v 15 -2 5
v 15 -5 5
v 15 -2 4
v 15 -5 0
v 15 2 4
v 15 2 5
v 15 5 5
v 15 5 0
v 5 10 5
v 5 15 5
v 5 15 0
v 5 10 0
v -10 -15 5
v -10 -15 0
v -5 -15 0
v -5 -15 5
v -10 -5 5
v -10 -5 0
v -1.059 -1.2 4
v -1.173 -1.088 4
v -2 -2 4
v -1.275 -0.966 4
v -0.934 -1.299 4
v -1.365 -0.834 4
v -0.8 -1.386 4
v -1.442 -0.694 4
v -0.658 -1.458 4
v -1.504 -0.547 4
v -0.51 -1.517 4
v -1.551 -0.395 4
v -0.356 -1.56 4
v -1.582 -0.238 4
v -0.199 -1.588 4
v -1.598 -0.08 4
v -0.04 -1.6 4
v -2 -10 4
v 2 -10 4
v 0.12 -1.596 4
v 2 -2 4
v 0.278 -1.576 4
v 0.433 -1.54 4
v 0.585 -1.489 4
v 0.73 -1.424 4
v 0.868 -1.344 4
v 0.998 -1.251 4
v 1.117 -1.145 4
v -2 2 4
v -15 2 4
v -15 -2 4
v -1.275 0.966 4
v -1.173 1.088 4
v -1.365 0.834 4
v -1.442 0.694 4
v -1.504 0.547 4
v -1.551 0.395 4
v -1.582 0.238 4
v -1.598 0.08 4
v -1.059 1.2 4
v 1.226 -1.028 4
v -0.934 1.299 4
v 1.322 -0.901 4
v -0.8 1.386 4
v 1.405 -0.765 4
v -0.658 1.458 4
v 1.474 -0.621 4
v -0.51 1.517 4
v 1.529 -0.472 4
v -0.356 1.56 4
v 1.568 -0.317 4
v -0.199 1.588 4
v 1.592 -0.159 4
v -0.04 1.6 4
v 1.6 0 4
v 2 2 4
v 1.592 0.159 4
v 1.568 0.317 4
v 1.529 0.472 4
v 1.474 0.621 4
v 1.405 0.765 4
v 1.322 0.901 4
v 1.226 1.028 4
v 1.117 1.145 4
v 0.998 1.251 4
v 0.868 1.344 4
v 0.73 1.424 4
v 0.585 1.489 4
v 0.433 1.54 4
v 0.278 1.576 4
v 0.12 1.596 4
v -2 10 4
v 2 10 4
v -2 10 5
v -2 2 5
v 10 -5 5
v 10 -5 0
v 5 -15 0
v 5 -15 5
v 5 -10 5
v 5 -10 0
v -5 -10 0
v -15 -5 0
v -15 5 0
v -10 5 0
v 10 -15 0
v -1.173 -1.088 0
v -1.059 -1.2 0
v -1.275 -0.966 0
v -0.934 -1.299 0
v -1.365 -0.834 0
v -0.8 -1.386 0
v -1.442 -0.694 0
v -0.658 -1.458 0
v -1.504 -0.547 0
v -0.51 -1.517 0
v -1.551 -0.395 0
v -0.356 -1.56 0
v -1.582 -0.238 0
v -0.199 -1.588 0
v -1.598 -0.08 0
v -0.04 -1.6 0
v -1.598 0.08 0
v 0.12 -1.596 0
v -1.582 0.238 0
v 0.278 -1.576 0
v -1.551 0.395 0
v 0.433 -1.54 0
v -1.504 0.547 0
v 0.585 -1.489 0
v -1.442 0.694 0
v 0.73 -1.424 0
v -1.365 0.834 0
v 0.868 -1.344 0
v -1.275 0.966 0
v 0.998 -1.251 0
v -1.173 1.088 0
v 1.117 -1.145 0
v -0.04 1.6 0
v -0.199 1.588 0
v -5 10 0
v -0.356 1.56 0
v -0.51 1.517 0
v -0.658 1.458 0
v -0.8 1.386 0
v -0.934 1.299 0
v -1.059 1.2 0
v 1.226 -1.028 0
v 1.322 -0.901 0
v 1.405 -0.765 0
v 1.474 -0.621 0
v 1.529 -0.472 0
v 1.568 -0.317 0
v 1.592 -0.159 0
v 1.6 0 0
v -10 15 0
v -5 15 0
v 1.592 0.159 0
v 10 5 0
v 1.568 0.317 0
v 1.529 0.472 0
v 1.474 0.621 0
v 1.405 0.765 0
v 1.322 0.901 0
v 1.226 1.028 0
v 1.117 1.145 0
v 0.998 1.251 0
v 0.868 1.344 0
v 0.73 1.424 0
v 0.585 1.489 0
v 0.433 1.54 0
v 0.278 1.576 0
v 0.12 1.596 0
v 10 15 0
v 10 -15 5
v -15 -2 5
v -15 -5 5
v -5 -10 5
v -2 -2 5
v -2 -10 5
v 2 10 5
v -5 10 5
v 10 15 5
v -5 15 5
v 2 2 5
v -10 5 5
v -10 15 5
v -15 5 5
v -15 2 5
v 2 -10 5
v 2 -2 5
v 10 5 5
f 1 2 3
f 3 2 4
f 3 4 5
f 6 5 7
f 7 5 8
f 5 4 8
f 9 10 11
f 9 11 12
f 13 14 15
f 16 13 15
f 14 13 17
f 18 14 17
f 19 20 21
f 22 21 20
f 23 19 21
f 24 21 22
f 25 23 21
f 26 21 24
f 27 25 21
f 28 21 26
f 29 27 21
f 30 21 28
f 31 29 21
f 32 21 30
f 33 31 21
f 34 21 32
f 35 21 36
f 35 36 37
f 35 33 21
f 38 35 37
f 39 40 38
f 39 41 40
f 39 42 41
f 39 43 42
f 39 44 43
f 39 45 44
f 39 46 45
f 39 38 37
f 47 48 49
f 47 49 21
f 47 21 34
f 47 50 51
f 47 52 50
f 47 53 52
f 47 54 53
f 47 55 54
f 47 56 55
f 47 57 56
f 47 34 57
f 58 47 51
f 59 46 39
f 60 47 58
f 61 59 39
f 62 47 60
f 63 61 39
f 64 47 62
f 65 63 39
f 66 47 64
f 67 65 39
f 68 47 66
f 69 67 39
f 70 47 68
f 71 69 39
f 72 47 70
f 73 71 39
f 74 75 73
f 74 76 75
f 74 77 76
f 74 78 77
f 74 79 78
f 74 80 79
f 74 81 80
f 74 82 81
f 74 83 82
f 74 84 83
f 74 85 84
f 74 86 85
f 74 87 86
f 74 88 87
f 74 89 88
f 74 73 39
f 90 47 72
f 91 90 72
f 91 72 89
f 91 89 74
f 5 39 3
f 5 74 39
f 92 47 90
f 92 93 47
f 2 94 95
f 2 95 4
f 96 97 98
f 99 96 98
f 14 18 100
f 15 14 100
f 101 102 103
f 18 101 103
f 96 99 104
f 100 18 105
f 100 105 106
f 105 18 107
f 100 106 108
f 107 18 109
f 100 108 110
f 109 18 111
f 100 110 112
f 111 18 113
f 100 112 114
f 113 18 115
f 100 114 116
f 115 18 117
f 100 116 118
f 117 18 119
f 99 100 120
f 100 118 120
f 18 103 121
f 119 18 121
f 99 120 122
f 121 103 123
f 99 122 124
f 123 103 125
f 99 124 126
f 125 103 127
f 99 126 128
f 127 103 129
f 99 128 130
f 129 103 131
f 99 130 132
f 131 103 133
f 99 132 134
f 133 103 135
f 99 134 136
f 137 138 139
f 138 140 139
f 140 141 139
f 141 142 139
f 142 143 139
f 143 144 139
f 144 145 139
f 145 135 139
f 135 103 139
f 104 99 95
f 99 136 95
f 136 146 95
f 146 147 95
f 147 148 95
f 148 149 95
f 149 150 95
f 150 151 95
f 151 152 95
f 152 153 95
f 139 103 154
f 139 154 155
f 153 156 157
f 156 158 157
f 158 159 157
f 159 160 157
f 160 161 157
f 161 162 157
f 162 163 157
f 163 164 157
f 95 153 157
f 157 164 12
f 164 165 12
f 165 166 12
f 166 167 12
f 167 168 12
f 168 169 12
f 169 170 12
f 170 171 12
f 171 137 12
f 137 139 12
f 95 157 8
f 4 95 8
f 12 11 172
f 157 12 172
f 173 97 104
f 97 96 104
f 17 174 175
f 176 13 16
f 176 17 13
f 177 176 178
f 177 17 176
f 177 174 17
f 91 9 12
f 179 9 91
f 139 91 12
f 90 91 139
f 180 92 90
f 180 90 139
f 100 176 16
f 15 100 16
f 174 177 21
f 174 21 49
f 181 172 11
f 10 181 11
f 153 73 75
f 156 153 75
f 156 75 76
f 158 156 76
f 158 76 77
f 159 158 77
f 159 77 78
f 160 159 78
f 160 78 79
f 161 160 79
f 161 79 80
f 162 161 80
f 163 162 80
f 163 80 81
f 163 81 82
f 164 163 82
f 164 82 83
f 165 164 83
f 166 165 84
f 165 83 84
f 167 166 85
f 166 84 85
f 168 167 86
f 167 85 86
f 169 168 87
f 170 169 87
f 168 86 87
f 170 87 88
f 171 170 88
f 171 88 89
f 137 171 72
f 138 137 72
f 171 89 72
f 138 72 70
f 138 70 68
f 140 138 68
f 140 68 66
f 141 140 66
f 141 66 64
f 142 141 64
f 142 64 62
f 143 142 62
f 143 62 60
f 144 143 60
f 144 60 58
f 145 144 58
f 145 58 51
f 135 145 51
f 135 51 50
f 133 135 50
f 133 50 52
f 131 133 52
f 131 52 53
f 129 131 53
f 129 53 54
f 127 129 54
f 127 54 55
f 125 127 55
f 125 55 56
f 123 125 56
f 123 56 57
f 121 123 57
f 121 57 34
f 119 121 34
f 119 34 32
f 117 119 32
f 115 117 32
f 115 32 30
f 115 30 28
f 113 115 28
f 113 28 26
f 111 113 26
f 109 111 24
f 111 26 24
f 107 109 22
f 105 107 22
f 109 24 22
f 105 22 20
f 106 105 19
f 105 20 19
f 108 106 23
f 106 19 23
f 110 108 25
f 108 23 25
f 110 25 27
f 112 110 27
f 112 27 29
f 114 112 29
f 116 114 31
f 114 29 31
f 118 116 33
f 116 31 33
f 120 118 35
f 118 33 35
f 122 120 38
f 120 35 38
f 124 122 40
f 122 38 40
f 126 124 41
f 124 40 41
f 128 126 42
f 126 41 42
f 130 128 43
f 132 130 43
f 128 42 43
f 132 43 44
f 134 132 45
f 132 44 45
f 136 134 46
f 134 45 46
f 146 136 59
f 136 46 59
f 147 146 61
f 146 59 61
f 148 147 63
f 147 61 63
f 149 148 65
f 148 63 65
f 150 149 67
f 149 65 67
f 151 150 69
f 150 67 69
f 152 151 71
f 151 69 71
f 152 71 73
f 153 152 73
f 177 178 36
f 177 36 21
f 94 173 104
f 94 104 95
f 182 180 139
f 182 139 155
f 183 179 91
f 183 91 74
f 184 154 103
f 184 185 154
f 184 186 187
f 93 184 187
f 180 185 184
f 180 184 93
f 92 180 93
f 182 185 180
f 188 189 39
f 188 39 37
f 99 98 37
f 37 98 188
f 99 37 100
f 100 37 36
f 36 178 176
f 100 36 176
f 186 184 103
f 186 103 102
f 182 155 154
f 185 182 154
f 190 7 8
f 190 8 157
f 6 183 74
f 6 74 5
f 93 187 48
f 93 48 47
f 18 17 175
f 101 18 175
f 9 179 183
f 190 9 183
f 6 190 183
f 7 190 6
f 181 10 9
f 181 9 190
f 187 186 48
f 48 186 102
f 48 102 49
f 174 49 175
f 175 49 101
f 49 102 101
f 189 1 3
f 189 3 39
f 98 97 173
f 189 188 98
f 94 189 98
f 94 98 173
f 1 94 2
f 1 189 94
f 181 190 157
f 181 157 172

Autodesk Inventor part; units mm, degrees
ref_plane "YZ Plane" through (0, 0, 0) normal (1, 0, 0) x (0, 1, 0)
ref_plane "XZ Plane" through (0, 0, 0) normal (0, 1, 0) x (-1, 0, 0)
ref_plane "XY Plane" through (0, 0, 0) normal (0, 0, 1) x (1, 0, 0)
sketch "スケッチ1" plane through (0, 0, 0) normal (0, 0, 1) x (1, 0, 0)
  line L0 (-15, -15) -> (15, -15)
  line L1 (15, -15) -> (15, 15)
  line L2 (15, 15) -> (-15, 15)
  line L3 (-15, 15) -> (-15, -15)
  line L4 (-15, -15) -> (15, 15) construction
  line L5 (15, -15) -> (-15, 15) construction
  point P0 (0, 0)
  dimension "d2" = 30
  dimension "d3" = 30
extrude "押し出し1" add sketch "スケッチ1" along normal blind 5
sketch "スケッチ2" plane through (0, 0, 5) normal (0, 0, 1) x (1, 0, 0)
  line L0 (-15, 15) -> (-10, 15)
  line L1 (-10, 15) -> (-10, 5)
  line L2 (-10, 5) -> (-15, 5)
  line L3 (-15, 5) -> (-15, 15)
  line L4 (-15, -15) -> (-10, -15)
  line L5 (-10, -15) -> (-10, -5)
  line L6 (-10, -5) -> (-15, -5)
  line L7 (-15, -5) -> (-15, -15)
  line L8 (15, 15) -> (-15, 15) projected
  line L9 (10, 15) -> (15, 15)
  line L10 (15, 15) -> (15, 5)
  line L11 (15, 5) -> (10, 5)
  line L12 (10, 5) -> (10, 15)
  line L13 (15, -15) -> (10, -15)
  line L14 (10, -15) -> (10, -5)
  line L15 (10, -5) -> (15, -5)
  line L16 (15, -5) -> (15, -15)
  line L17 (-5, 15) -> (5, 15)
  line L18 (5, 15) -> (5, 10)
  line L19 (5, 10) -> (-5, 10)
  line L20 (-5, 10) -> (-5, 15)
  line L21 (-15, -15) -> (15, -15) projected
  line L22 (-5, -15) -> (5, -15)
  line L23 (5, -15) -> (5, -10)
  line L24 (5, -10) -> (-5, -10)
  line L25 (-5, -10) -> (-5, -15)
  point P0 (0, 0)
  dimension "d6" = 10
  dimension "d7" = 10
  dimension "d8" = 5
  dimension "d9" = 10
  dimension "d10" = 5
  dimension "d11" = 5
  dimension "d12" = 10
  dimension "d13" = 10
  dimension "d14" = 5
  dimension "d15" = 5
  dimension "d16" = 5
extrude "押し出し2" cut sketch "スケッチ2" against normal blind 5
sketch "スケッチ4" plane through (0, 0, 5) normal (0, 0, 1) x (1, 0, 0)
  line L0 (-20.2222, 2) -> (20.2222, 2)
  line L1 (20.2222, 2) -> (20.2222, -2)
  line L2 (20.2222, -2) -> (-20.2222, -2)
  line L3 (-20.2222, -2) -> (-20.2222, 2)
  line L4 (-20.2222, 2) -> (20.2222, -2) construction
  line L5 (20.2222, 2) -> (-20.2222, -2) construction
  line L6 (-2, 16.5333) -> (2, 16.5333)
  line L7 (2, 16.5333) -> (2, -16.5333)
  line L8 (2, -16.5333) -> (-2, -16.5333)
  line L9 (-2, -16.5333) -> (-2, 16.5333)
  line L10 (-2, 16.5333) -> (2, -16.5333) construction
  line L11 (2, 16.5333) -> (-2, -16.5333) construction
  point P0 (0, 0)
  dimension "d19" = 4
  dimension "d20" = 4
extrude "押し出し3" cut sketch "スケッチ4" against normal blind 1
sketch "スケッチ5" plane through (0, 0, 5) normal (0, 0, 1) x (1, 0, 0)
  circle A0 centre (0, 0) radius 1.6
  dimension "d23" = 3.2
extrude "押し出し4" cut sketch "スケッチ5" against normal up to next
sketch "スケッチ7" plane through (0, 0, 5) normal (0, 0, 1) x (1, 0, 0)
  line L0 (-10, 5) -> (-11.0607, 6.0607) construction
  circle A0 centre (-11.0607, 6.0607) radius 1.5
  line L1 (-10, 5) -> (-15, 5) construction
  line L2 (-5, 10) -> (-3.8771, 10) construction
  line L3 (-2, 10) -> (-5, 10) projected
  line L4 (-5, 10) -> (-3.9393, 11.0607) construction
  circle A1 centre (-3.9393, 11.0607) radius 1.5
  line L5 (0, 0) -> (-3.2296, 0)
  line L6 (0, 0) -> (0, 2.4653)
  line L7 (10, 5) -> (11.0607, 6.0607) construction
  circle A2 centre (11.0607, 6.0607) radius 1.5
  line L8 (10, 5) -> (15, 5) construction
  line L9 (5, 10) -> (3.8771, 10) construction
  line L10 (2, 10) -> (5, 10)
  line L11 (5, 10) -> (3.9393, 11.0607) construction
  circle A3 centre (3.9393, 11.0607) radius 1.5
  line L12 (-10, -5) -> (-11.0607, -6.0607) construction
  circle A4 centre (-11.0607, -6.0607) radius 1.5
  line L13 (-10, -5) -> (-15, -5) construction
  line L14 (-5, -10) -> (-3.8771, -10) construction
  line L15 (-2, -10) -> (-5, -10)
  line L16 (-5, -10) -> (-3.9393, -11.0607) construction
  circle A5 centre (-3.9393, -11.0607) radius 1.5
  line L17 (10, -5) -> (11.0607, -6.0607) construction
  circle A6 centre (11.0607, -6.0607) radius 1.5
  line L18 (10, -5) -> (15, -5) construction
  line L19 (5, -10) -> (3.8771, -10) construction
  line L20 (2, -10) -> (5, -10)
  line L21 (5, -10) -> (3.9393, -11.0607) construction
  circle A7 centre (3.9393, -11.0607) radius 1.5
  dimension "d27" = 3
  dimension "d29" = 3
  dimension "d26" = 45
  dimension "d28" = 45
extrude "押し出し5" [suppressed]
properties part number "piece_1"
